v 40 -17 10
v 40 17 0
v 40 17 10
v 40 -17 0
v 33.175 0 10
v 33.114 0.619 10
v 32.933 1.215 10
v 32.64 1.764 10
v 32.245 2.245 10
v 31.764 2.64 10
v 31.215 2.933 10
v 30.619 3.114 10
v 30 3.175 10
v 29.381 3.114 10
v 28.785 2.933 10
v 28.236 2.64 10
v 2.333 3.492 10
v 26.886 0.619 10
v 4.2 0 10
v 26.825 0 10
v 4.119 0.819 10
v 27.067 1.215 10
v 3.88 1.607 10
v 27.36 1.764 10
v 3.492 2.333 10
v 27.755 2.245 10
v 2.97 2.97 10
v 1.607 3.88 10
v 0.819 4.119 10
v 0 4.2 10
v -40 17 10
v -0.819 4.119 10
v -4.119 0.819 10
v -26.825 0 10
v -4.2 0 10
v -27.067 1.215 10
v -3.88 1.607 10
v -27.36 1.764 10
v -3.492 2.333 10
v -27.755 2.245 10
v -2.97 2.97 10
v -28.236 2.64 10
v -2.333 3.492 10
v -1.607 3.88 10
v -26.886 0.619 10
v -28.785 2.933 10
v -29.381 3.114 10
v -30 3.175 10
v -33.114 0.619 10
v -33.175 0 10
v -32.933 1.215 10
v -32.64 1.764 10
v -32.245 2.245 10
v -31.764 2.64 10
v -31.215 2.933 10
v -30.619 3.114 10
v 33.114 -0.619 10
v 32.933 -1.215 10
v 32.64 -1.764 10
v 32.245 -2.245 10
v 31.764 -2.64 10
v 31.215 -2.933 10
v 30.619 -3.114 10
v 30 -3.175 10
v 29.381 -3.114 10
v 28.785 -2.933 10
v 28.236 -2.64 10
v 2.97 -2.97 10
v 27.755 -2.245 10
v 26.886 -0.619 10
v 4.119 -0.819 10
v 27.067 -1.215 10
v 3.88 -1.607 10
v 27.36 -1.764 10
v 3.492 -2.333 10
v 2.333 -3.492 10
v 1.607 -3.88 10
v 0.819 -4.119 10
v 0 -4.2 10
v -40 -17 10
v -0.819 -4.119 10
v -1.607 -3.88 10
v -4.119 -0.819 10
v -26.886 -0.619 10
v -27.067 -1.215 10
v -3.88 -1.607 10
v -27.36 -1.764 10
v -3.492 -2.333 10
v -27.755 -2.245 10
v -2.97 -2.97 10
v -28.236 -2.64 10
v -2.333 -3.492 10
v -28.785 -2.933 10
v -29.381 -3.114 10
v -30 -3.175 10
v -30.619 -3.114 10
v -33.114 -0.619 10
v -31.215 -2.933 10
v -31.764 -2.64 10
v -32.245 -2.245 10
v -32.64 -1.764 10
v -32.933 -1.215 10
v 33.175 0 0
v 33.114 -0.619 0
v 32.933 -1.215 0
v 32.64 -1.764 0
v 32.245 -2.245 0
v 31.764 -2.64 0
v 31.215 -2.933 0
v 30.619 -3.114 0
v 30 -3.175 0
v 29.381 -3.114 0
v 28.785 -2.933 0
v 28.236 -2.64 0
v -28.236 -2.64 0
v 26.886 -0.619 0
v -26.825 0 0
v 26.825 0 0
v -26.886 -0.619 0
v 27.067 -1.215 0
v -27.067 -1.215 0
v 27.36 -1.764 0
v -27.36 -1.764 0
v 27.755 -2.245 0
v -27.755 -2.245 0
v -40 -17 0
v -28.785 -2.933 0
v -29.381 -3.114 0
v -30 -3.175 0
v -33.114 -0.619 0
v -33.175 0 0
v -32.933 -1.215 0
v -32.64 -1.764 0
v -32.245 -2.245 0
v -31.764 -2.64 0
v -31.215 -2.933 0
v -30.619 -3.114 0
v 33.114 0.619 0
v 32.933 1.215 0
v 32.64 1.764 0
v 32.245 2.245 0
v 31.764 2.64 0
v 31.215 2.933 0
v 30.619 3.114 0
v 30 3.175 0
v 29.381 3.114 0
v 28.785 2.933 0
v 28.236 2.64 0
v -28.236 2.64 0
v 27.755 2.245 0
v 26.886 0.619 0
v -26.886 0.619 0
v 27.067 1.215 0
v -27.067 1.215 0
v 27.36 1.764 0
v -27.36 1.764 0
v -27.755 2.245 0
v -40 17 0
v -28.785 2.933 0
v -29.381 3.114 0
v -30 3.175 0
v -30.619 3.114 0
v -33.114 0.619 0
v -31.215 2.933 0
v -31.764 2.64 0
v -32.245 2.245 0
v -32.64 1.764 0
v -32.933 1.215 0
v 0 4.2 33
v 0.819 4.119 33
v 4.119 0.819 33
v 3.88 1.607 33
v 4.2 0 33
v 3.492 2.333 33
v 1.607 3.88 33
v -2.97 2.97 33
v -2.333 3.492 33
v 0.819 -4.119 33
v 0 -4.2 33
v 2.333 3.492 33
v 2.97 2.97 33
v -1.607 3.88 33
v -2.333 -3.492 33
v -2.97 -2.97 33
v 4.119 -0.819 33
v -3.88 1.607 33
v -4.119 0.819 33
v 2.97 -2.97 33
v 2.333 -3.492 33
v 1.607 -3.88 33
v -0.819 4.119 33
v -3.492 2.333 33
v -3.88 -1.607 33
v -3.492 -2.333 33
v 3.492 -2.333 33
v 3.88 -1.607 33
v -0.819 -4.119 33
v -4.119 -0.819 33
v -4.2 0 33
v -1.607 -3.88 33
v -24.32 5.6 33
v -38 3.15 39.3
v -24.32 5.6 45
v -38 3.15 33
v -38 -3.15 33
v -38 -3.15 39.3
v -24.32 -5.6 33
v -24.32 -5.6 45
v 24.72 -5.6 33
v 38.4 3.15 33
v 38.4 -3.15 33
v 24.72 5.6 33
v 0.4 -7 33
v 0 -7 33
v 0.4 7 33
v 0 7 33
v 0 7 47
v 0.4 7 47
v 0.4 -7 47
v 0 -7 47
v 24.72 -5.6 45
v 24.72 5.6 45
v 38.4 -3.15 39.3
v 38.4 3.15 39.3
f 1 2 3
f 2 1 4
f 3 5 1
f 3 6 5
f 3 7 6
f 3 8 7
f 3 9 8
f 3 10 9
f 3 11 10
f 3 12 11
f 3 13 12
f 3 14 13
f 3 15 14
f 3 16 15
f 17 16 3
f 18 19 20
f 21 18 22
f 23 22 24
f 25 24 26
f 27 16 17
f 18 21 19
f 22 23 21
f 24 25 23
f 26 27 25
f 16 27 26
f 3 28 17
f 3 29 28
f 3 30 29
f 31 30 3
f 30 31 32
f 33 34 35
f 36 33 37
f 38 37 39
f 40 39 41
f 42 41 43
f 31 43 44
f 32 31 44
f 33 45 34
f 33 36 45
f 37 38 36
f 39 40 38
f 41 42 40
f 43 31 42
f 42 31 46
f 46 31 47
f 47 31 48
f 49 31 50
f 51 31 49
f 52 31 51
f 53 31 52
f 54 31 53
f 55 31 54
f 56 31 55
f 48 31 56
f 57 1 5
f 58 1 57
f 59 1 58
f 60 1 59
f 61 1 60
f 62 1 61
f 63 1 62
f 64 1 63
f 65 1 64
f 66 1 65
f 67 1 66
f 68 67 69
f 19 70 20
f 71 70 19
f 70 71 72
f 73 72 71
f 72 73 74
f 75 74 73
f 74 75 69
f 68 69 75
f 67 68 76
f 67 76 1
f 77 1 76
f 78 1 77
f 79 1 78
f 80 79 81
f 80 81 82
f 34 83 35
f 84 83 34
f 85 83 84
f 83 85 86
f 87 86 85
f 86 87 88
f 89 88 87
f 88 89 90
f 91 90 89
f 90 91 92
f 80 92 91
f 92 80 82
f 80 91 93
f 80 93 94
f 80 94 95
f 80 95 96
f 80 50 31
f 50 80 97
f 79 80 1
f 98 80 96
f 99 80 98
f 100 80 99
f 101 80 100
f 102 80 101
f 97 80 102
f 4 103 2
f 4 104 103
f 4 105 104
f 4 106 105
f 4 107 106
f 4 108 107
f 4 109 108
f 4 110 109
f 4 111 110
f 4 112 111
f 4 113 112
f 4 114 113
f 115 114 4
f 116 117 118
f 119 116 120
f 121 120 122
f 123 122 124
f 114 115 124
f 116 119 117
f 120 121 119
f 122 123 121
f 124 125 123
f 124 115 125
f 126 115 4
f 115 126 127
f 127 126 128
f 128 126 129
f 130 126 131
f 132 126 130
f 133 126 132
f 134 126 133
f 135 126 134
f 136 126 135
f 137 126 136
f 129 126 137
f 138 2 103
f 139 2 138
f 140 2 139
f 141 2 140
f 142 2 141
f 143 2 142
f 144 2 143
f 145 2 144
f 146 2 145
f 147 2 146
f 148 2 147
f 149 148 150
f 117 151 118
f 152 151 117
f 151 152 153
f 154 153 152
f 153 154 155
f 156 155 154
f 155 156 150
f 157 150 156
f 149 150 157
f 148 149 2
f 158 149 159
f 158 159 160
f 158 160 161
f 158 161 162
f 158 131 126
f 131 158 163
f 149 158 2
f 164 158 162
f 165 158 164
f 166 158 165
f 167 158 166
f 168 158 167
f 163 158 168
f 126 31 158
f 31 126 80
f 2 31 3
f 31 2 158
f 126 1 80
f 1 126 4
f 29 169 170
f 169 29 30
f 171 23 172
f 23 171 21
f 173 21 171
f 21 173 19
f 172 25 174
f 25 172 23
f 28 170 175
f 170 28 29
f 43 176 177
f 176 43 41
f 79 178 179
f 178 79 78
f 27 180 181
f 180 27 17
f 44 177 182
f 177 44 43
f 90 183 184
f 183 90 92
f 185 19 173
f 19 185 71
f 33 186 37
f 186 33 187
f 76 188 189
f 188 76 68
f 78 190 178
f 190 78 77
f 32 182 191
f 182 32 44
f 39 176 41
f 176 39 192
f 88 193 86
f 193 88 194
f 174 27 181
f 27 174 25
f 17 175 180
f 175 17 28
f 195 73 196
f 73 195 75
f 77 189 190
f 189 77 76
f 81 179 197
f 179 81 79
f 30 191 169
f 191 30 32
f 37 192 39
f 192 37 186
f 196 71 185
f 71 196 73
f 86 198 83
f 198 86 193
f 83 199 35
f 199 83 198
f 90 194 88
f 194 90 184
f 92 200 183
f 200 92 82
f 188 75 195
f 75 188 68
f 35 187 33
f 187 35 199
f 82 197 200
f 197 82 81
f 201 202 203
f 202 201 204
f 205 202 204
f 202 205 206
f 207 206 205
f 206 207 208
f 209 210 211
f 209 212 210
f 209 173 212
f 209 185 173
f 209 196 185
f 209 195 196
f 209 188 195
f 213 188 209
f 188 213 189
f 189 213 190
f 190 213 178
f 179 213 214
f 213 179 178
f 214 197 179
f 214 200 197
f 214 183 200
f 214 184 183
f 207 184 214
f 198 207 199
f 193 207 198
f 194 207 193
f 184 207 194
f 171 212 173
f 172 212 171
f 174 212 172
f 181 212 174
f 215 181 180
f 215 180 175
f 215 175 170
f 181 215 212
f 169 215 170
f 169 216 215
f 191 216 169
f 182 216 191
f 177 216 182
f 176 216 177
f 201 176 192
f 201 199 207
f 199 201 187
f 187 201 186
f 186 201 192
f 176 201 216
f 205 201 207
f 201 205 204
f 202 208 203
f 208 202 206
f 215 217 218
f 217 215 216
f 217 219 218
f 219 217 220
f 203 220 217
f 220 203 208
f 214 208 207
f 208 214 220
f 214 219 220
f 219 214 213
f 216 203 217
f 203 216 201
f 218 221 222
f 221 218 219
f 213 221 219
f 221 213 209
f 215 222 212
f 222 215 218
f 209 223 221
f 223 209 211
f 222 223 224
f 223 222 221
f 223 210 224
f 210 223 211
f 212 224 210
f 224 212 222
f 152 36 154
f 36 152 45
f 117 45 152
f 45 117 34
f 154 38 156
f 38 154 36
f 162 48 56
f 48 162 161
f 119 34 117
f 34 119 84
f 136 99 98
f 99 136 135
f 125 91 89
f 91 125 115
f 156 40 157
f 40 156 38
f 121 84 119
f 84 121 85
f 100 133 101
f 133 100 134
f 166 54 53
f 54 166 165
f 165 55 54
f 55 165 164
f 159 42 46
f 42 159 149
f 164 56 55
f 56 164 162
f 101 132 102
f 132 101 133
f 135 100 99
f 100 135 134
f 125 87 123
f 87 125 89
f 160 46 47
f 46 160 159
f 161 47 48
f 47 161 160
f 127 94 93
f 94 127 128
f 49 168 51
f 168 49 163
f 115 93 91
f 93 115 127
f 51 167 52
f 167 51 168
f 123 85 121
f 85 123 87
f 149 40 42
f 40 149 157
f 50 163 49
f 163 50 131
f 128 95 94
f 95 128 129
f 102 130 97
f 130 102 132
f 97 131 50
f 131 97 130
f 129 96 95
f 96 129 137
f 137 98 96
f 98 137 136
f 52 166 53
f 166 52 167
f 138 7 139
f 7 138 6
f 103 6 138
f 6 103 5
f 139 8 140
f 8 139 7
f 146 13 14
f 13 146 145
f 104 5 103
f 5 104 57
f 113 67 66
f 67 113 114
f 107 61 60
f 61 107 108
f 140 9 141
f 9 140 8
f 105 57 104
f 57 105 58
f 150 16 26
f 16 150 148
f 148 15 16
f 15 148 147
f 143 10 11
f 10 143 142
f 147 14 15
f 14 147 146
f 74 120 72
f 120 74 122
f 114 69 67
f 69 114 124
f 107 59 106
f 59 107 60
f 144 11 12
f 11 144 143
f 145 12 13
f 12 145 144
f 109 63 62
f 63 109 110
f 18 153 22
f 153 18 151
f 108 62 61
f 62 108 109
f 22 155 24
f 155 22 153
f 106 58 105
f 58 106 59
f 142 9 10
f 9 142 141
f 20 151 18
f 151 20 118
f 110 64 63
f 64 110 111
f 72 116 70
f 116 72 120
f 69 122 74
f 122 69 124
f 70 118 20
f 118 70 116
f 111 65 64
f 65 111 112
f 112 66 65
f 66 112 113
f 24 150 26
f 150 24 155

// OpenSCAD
$fn = 32;

// ----------------------------------------------------------------------
// Boat cleat: 80 mm base, horn 40 mm up
// ----------------------------------------------------------------------

// --- parameters (mm) ---
base_l = 80;              // base length
base_w = 34;              // base width
base_t = 10;              // base thickness
horn_len = 76;            // horn length
horn_d = 14;              // horn diameter at the middle
horn_z = 40;              // horn axis height
end_drop = 8;             // how far the horn tips drop
post_d = 8.4;             // centre post diameter
holes_d = 6.35;           // fixing holes
hole_x = 30;              // fixing hole spacing

difference() {
  union() {
    translate([-40, -17, 0]) cube([base_l, base_w, base_t]);
    /* centre post, sunk 1 mm into the base */
    translate([0, 0, 9]) cylinder(h = 31, d = post_d);
    /* horn: a hull chain of boxes, full in the middle and lighter at the tips */
    hull() {
      translate([-38, -3.15, 33]) cube([0.4, 6.3, 6.3], center = false);
      translate([-24.32, -5.6, 33]) cube([0.4, 11.2, 12], center = false);
    }
    hull() {
      translate([-24.32, -5.6, 33]) cube([0.4, 11.2, 12], center = false);
      translate([0, -7, 33]) cube([0.4, 14, 14], center = false);
    }
    hull() {
      translate([0, -7, 33]) cube([0.4, 14, 14], center = false);
      translate([24.32, -5.6, 33]) cube([0.4, 11.2, 12], center = false);
    }
    hull() {
      translate([24.32, -5.6, 33]) cube([0.4, 11.2, 12], center = false);
      translate([38, -3.15, 33]) cube([0.4, 6.3, 6.3], center = false);
    }
  }
  translate([-30, 0, -2.5]) cylinder(h = base_t + 5, d = holes_d);
  translate([30, 0, -2.5]) cylinder(h = base_t + 5, d = holes_d);
}
